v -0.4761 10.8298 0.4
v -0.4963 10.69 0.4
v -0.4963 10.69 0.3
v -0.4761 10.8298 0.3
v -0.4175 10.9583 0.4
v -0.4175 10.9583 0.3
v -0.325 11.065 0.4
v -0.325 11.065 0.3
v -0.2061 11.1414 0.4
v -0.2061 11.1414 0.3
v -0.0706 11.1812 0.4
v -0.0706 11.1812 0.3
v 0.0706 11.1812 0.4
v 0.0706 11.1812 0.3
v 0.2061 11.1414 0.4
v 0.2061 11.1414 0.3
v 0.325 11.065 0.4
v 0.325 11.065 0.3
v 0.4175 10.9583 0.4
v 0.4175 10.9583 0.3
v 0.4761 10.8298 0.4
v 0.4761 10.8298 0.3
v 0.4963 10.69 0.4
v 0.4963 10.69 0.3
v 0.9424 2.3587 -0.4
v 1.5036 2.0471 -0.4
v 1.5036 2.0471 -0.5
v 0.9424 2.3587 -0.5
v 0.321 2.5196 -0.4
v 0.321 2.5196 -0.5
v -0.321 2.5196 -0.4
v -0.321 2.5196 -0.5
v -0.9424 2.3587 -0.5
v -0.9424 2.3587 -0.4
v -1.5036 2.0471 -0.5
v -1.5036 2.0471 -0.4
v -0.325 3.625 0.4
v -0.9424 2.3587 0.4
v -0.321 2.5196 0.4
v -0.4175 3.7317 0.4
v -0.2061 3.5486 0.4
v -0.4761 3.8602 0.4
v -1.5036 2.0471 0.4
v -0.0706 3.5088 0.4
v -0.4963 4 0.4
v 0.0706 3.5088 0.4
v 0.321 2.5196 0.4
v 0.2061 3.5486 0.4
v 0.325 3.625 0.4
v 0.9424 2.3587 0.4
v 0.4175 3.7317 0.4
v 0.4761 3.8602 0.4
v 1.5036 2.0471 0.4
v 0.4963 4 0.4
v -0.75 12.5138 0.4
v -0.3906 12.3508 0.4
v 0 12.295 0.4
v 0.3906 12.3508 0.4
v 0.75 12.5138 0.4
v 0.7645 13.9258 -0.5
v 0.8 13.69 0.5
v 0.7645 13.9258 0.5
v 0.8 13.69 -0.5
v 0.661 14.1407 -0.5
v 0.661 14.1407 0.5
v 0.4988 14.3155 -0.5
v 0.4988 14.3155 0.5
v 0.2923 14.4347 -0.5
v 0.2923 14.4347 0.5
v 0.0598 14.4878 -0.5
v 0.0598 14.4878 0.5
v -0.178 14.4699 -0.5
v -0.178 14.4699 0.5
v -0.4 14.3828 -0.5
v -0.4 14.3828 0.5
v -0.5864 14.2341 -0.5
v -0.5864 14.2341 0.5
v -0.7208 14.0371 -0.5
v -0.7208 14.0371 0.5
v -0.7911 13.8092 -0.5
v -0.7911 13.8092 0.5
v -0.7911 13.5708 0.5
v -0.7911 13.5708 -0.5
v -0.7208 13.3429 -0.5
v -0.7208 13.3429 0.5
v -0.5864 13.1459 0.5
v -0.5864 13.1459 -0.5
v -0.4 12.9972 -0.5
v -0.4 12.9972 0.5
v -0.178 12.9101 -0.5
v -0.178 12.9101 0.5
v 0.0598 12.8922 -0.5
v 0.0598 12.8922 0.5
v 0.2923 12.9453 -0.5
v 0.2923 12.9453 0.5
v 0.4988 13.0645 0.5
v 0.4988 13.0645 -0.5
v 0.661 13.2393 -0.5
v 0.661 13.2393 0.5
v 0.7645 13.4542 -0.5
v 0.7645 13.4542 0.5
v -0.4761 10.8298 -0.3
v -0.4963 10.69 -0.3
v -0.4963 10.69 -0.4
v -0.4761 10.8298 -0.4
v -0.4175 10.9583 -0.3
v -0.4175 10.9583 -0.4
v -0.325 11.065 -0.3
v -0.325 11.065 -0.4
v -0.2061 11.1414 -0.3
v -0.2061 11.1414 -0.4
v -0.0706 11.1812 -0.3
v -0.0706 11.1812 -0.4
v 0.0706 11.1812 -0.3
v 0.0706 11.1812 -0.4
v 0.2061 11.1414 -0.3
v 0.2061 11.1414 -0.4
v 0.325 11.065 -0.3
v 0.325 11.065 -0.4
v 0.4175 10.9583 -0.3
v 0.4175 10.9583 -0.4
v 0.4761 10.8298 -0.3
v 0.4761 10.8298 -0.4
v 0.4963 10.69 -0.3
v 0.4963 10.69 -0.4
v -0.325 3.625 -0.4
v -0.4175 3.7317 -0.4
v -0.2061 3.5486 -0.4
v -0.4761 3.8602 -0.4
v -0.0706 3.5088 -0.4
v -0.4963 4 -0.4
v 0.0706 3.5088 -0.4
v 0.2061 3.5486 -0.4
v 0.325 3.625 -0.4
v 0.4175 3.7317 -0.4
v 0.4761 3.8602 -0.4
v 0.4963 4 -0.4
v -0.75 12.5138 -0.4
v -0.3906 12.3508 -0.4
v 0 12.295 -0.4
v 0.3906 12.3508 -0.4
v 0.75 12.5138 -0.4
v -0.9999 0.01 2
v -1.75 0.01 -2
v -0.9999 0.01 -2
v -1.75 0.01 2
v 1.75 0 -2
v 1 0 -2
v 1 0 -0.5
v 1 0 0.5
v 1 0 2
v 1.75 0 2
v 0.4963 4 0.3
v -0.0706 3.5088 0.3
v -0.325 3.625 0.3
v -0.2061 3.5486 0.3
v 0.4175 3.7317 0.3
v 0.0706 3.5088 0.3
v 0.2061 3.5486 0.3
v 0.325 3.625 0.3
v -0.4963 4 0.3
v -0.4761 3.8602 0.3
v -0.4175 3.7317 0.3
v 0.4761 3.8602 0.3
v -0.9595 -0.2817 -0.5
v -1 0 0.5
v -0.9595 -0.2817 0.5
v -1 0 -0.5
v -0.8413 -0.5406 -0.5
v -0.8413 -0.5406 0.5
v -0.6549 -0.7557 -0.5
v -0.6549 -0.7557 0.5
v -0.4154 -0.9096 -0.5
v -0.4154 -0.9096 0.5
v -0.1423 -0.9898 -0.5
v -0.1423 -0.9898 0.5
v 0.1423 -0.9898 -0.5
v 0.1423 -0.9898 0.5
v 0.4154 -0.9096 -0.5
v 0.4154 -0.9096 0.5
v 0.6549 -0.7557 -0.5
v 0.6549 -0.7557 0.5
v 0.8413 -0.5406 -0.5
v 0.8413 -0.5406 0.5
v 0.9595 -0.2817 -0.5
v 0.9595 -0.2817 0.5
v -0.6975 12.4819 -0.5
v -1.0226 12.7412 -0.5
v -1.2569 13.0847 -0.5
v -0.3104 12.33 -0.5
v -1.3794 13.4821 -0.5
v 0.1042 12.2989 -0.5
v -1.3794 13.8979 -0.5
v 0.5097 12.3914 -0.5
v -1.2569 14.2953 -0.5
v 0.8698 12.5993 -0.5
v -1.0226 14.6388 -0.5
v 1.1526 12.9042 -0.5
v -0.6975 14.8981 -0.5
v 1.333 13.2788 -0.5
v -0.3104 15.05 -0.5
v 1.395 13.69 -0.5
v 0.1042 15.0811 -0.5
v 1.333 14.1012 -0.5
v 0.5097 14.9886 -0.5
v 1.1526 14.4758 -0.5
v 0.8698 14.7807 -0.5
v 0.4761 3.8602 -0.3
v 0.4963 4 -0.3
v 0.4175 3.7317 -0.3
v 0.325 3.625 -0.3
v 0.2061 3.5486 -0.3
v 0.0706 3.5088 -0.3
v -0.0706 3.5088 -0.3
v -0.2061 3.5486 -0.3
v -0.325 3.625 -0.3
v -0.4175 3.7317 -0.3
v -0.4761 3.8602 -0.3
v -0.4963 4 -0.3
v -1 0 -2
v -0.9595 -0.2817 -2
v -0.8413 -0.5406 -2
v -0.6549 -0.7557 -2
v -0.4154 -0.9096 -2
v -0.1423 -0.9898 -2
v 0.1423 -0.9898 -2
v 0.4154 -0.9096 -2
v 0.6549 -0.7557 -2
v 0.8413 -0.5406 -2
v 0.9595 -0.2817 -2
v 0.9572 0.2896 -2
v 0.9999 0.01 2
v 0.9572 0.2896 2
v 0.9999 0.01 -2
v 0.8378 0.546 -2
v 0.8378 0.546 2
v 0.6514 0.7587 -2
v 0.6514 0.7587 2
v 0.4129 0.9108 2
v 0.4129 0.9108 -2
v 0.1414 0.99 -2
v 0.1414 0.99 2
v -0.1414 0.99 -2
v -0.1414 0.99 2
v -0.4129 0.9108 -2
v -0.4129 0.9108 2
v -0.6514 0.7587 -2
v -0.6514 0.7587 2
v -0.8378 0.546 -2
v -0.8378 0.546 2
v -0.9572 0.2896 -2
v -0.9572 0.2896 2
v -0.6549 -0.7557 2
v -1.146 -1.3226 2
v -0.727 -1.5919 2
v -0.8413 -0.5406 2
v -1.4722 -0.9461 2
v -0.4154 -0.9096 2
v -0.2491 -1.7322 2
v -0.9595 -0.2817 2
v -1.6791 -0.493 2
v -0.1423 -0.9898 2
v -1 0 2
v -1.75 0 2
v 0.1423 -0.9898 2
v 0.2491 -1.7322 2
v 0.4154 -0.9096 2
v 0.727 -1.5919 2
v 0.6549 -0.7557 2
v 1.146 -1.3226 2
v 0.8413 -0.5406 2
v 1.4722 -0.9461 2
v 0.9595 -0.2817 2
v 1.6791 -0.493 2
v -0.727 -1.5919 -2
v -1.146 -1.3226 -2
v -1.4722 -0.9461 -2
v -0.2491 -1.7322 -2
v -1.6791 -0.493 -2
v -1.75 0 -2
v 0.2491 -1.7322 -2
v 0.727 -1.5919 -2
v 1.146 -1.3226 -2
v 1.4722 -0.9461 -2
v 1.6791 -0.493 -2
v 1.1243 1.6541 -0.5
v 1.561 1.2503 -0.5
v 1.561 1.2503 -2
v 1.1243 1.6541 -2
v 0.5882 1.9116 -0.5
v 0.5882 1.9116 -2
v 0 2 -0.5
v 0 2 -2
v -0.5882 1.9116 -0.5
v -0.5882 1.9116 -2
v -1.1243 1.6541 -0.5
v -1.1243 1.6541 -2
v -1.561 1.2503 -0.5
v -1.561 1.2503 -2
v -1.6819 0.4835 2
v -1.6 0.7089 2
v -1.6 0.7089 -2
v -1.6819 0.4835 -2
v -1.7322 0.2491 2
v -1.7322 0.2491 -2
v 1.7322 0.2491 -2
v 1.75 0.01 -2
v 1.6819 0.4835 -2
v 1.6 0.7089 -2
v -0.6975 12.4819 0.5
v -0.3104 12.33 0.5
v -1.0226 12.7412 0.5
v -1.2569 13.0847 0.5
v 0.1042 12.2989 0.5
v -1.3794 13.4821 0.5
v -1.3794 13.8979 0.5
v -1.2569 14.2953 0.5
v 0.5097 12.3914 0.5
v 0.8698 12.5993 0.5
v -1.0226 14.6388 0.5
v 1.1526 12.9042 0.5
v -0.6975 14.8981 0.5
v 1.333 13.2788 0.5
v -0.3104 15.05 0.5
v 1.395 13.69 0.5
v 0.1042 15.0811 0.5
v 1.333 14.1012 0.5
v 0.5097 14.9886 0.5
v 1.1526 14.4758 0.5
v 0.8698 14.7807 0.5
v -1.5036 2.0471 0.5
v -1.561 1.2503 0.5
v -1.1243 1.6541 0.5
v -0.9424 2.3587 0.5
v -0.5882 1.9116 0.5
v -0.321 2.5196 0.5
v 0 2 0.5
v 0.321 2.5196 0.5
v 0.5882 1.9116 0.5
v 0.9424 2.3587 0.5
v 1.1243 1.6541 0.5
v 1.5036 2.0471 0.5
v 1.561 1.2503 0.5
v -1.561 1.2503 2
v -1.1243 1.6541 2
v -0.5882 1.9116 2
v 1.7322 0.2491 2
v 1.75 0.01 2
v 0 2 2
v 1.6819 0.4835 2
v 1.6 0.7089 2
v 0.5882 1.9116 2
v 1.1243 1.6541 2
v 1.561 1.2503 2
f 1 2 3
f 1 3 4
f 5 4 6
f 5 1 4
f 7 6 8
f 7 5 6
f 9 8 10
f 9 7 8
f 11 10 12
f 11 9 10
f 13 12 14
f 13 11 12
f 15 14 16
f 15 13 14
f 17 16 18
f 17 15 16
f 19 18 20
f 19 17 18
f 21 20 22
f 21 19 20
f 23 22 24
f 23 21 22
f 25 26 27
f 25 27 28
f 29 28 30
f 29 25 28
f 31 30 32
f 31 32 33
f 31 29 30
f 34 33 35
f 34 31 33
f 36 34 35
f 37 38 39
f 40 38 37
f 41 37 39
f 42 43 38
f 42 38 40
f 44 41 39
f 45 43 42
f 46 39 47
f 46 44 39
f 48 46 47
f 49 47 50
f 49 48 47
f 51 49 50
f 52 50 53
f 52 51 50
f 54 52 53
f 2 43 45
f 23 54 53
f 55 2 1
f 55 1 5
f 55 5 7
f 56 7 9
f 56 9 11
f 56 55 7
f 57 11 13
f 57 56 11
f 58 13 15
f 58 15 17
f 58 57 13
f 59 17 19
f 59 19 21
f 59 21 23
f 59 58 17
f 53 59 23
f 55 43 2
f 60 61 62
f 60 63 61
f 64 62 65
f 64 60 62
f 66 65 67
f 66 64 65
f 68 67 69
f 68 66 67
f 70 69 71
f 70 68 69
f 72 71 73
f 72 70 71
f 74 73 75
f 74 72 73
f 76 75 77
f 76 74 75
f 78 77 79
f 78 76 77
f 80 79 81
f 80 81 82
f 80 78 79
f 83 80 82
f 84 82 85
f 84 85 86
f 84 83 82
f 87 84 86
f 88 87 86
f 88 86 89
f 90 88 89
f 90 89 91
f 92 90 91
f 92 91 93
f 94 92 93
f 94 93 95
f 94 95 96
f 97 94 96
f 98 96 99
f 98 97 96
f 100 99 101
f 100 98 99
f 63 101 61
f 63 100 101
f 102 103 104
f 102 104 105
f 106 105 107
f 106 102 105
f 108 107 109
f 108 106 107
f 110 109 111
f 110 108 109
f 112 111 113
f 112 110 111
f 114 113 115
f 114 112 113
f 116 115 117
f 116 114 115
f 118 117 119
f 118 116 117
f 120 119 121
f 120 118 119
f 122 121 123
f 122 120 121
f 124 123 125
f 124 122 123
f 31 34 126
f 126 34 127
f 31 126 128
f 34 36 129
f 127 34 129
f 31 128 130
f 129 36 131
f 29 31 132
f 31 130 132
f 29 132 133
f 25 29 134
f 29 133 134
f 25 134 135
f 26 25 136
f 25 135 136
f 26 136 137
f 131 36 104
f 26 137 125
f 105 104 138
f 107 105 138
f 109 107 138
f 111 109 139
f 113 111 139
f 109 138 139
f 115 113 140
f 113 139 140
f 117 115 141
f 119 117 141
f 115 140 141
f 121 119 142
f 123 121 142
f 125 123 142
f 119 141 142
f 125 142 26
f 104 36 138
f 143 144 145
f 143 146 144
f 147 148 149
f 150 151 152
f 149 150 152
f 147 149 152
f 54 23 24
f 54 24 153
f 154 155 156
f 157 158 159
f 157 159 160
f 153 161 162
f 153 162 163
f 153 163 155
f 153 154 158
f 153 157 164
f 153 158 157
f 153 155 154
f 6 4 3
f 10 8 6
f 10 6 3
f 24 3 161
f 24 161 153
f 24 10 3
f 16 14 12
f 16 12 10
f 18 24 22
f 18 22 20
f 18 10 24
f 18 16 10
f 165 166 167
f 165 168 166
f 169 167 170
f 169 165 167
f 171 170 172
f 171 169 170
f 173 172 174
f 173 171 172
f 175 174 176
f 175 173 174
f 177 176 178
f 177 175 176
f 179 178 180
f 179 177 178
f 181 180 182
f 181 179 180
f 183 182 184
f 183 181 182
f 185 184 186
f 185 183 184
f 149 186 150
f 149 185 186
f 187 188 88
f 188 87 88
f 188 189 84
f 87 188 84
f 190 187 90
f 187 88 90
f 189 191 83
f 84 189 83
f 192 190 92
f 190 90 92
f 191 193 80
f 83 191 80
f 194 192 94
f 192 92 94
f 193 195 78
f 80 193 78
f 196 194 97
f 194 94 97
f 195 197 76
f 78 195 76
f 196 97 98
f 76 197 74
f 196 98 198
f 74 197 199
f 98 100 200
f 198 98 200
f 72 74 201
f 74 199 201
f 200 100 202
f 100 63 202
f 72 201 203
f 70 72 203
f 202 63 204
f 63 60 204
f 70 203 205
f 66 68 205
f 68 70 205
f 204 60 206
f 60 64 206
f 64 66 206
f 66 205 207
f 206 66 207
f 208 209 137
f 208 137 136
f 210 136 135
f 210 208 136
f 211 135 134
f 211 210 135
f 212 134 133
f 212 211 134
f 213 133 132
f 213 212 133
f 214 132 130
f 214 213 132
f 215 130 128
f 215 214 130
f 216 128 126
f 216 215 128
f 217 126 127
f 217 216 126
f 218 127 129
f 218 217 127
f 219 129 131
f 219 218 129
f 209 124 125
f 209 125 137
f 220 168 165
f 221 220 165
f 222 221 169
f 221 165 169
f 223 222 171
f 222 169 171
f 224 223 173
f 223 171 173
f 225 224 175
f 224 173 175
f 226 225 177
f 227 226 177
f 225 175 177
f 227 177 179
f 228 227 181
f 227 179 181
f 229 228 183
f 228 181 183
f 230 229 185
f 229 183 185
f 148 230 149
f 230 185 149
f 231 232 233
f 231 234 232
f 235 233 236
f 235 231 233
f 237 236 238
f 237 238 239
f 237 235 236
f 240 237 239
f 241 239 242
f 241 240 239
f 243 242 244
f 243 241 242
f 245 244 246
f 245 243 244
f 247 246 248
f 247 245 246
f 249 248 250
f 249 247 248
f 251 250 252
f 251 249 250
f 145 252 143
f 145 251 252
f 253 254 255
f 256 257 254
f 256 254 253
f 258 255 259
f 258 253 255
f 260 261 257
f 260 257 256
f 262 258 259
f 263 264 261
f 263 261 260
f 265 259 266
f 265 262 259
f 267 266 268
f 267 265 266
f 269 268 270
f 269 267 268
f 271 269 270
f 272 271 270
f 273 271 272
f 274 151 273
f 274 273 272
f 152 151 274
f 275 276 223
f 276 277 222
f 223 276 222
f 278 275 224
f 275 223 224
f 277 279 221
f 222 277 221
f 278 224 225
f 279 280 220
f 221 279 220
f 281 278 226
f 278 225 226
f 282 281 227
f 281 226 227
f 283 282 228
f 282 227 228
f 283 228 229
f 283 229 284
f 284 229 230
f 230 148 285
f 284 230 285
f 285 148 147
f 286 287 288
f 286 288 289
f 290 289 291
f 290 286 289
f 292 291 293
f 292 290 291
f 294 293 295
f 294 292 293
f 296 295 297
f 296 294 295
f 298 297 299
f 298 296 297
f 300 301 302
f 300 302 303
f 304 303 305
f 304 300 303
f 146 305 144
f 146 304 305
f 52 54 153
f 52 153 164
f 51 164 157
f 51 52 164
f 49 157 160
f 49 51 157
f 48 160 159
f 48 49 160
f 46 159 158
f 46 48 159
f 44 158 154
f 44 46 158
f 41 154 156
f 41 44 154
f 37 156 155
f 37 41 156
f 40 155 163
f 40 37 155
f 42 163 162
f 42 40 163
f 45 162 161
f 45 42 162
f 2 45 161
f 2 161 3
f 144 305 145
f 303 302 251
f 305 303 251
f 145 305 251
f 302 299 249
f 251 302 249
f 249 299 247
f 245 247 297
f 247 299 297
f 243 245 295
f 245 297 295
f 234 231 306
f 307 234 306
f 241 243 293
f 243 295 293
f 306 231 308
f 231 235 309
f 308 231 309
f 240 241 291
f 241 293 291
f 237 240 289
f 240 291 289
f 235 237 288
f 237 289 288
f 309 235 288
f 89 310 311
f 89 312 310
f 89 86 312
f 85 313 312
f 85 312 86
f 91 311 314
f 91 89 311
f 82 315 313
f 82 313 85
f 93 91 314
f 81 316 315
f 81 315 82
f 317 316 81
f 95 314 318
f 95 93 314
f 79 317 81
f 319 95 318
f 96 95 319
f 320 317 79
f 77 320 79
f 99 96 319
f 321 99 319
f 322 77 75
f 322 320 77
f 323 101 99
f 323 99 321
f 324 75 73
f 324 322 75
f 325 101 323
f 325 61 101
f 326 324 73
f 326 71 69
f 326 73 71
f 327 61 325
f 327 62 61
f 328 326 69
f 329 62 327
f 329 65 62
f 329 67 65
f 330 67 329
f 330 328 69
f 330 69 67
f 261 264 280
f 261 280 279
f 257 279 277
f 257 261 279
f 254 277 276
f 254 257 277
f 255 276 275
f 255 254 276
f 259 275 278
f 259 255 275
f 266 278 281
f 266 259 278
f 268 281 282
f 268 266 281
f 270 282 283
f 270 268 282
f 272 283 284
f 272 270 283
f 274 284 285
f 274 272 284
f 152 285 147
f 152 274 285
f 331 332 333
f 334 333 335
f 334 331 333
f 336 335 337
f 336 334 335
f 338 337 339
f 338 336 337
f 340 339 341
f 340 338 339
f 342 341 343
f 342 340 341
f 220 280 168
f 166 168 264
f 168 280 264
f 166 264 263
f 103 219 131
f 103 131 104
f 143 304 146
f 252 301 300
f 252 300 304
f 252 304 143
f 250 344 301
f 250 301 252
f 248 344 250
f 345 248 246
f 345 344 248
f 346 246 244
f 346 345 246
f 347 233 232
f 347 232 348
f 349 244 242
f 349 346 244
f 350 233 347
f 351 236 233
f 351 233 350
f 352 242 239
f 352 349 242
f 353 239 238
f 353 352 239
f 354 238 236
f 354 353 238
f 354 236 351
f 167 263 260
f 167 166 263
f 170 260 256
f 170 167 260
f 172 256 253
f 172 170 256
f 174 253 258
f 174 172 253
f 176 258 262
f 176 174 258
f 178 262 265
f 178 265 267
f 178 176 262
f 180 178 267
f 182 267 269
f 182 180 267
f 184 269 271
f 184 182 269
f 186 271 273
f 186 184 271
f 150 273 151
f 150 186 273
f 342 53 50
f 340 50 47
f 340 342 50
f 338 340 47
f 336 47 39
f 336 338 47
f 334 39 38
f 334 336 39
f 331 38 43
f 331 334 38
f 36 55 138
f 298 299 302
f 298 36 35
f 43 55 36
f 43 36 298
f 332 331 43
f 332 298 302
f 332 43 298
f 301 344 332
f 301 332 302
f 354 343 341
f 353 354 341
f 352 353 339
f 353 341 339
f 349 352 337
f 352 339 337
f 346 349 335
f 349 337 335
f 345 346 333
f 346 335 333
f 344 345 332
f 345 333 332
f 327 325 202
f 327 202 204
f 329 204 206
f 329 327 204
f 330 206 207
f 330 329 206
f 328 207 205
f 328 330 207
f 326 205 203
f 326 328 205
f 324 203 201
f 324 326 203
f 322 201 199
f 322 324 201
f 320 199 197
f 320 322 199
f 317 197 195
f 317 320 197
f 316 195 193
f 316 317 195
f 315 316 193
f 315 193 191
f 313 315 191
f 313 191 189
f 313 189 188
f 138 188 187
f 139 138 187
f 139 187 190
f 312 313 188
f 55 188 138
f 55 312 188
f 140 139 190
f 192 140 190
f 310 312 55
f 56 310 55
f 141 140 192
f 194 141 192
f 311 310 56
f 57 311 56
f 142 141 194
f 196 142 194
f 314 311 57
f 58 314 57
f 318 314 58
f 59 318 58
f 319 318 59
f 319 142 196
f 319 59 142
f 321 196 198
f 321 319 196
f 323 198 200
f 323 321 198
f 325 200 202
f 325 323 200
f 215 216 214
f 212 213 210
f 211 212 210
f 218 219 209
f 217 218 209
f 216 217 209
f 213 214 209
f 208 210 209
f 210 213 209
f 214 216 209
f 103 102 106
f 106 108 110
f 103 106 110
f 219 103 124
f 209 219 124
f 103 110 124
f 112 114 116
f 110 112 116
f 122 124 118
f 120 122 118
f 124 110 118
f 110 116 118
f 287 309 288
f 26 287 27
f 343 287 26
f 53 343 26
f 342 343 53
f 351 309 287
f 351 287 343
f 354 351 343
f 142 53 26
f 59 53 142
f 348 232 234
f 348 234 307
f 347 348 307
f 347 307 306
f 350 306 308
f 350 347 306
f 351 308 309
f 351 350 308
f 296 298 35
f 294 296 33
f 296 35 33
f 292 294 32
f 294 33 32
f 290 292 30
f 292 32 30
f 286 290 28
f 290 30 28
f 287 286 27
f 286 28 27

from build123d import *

# Parameters (mm, degrees)
SKETCH1_R                = 1.395
SKETCH1_R_2              = 0.8
BOSS_EXTRUDE1_DEPTH      = 0.5
SKETCH1_R_3              = 2.54
SKETCH1_R_4              = 1
BOSS_EXTRUDE1_2_DEPTH    = 0.5
BOSS_EXTRUDE2_DEPTH      = 0.4
BOSS_EXTRUDE3_DEPTH      = 0.3
BOSS_EXTRUDE4_DEPTH      = 1.5
BOSS_EXTRUDE4_DEPTH_BACK = 2.5
SKETCH2_R                = 2
SKETCH2_R_2              = 1
CUT_EXTRUDE1_DEPTH       = 15.75
SKETCH4_W                = 11.932822614
SKETCH4_H                = 0.01
CUT_EXTRUDE2_DEPTH       = 15.75


with BuildPart() as part:
    # Sketch1 → Boss-Extrude1 (new, symmetric)
    with BuildSketch(Plane.XY):
        with Locations((0, 13.69)):
            Circle(SKETCH1_R)
        with Locations((0, 13.69)):
            Circle(SKETCH1_R_2, mode=Mode.SUBTRACT)
    extrude(amount=BOSS_EXTRUDE1_DEPTH, both=True)



with BuildPart() as body_2:
    # Sketch1 → Boss-Extrude1 2 (new, symmetric)
    with BuildSketch(Plane.XY):
        Circle(SKETCH1_R_3)
        Circle(SKETCH1_R_4, mode=Mode.SUBTRACT)
    extrude(amount=BOSS_EXTRUDE1_2_DEPTH, both=True)


with BuildPart() as part_1:
    add(part.part)

    add(body_2.part)  # Boss-Extrude2 merges body 2
    # Sketch1<3> → Boss-Extrude2 (add, symmetric)
    with BuildSketch(Plane.XY):
        with BuildLine():
            ThreePointArc((0.75, 12.513766605), (0, 12.295), (-0.75, 12.513766605))
            Line((-0.75, 12.513766605), (-1.65, 1.931087776))
            ThreePointArc((-1.65, 1.931087776), (0, 2.54), (1.65, 1.931087776))
            Line((1.65, 1.931087776), (0.75, 12.513766605))
        make_face()
        with BuildLine():
            ThreePointArc((-0.496250448, 10.69), (0, 11.186250448), (0.496250448, 10.69))
            Line((0.496250448, 10.69), (0.496250448, 4))
            ThreePointArc((0.496250448, 4), (0, 3.503749552), (-0.496250448, 4))
            Line((-0.496250448, 4), (-0.496250448, 10.69))
        make_face(mode=Mode.SUBTRACT)
    extrude(amount=BOSS_EXTRUDE2_DEPTH, both=True)

    # Sketch1<4> → Boss-Extrude3 (add, symmetric)
    with BuildSketch(Plane.XY):
        with BuildLine():
            Line((0.496250448, 4), (0.496250448, 10.69))
            ThreePointArc((0.496250448, 10.69), (0, 11.186250448), (-0.496250448, 10.69))
            Line((-0.496250448, 10.69), (-0.496250448, 4))
            ThreePointArc((-0.496250448, 4), (0, 3.503749552), (0.496250448, 4))
        make_face()
    extrude(amount=BOSS_EXTRUDE3_DEPTH, both=True)

    # Sketch2 → Boss-Extrude4 (add, two sides: drawn at the far end of the back side and taken through both)
    with BuildSketch(Plane.XY.offset(0.5).offset(-BOSS_EXTRUDE4_DEPTH_BACK)):
        Circle(SKETCH2_R)
        Circle(SKETCH2_R_2, mode=Mode.SUBTRACT)
    extrude(amount=BOSS_EXTRUDE4_DEPTH + BOSS_EXTRUDE4_DEPTH_BACK)

    # Sketch3 → Cut-Extrude1 (cut, symmetric)
    with BuildSketch(Plane.XY):
        with BuildLine():
            Line((-2.441497921, 2.507805395), (-0.75, 12.513766605))
            Line((-0.75, 12.513766605), (-1.6, 0.708872344))
            ThreePointArc((-1.6, 0.708872344), (0, -1.75), (1.6, 0.708872344))
            Line((1.6, 0.708872344), (0.75, 12.513766605))
            Line((0.75, 12.513766605), (2.441497921, 2.507805395))
            ThreePointArc((2.441497921, 2.507805395), (0, -3.5), (-2.441497921, 2.507805395))
        make_face()
    extrude(amount=CUT_EXTRUDE1_DEPTH, both=True, mode=Mode.SUBTRACT)

    # Sketch4 → Cut-Extrude2 (cut, symmetric)
    with BuildSketch(Plane.XY):
        with Locations((1.140460914, 0.005)):
            Rectangle(SKETCH4_W, SKETCH4_H)
    extrude(amount=CUT_EXTRUDE2_DEPTH, both=True, mode=Mode.SUBTRACT)


with BuildPart() as cut_extrude2_piece_1:
    # of the separate pieces the step leaves, piece 1, a body of its own (cut_extrude2_pieces)
    add(part_1.part.solids().sort_by_distance((1.503641437, 2.047110751, -0.5))[0])


with BuildPart() as cut_extrude2_piece_2:
    # of the separate pieces the step leaves, piece 2, a body of its own (cut_extrude2_pieces)
    add(part_1.part.solids().sort_by_distance((-1.75, 0, 2))[0])


solid = Compound([cut_extrude2_piece_1.part, cut_extrude2_piece_2.part])
